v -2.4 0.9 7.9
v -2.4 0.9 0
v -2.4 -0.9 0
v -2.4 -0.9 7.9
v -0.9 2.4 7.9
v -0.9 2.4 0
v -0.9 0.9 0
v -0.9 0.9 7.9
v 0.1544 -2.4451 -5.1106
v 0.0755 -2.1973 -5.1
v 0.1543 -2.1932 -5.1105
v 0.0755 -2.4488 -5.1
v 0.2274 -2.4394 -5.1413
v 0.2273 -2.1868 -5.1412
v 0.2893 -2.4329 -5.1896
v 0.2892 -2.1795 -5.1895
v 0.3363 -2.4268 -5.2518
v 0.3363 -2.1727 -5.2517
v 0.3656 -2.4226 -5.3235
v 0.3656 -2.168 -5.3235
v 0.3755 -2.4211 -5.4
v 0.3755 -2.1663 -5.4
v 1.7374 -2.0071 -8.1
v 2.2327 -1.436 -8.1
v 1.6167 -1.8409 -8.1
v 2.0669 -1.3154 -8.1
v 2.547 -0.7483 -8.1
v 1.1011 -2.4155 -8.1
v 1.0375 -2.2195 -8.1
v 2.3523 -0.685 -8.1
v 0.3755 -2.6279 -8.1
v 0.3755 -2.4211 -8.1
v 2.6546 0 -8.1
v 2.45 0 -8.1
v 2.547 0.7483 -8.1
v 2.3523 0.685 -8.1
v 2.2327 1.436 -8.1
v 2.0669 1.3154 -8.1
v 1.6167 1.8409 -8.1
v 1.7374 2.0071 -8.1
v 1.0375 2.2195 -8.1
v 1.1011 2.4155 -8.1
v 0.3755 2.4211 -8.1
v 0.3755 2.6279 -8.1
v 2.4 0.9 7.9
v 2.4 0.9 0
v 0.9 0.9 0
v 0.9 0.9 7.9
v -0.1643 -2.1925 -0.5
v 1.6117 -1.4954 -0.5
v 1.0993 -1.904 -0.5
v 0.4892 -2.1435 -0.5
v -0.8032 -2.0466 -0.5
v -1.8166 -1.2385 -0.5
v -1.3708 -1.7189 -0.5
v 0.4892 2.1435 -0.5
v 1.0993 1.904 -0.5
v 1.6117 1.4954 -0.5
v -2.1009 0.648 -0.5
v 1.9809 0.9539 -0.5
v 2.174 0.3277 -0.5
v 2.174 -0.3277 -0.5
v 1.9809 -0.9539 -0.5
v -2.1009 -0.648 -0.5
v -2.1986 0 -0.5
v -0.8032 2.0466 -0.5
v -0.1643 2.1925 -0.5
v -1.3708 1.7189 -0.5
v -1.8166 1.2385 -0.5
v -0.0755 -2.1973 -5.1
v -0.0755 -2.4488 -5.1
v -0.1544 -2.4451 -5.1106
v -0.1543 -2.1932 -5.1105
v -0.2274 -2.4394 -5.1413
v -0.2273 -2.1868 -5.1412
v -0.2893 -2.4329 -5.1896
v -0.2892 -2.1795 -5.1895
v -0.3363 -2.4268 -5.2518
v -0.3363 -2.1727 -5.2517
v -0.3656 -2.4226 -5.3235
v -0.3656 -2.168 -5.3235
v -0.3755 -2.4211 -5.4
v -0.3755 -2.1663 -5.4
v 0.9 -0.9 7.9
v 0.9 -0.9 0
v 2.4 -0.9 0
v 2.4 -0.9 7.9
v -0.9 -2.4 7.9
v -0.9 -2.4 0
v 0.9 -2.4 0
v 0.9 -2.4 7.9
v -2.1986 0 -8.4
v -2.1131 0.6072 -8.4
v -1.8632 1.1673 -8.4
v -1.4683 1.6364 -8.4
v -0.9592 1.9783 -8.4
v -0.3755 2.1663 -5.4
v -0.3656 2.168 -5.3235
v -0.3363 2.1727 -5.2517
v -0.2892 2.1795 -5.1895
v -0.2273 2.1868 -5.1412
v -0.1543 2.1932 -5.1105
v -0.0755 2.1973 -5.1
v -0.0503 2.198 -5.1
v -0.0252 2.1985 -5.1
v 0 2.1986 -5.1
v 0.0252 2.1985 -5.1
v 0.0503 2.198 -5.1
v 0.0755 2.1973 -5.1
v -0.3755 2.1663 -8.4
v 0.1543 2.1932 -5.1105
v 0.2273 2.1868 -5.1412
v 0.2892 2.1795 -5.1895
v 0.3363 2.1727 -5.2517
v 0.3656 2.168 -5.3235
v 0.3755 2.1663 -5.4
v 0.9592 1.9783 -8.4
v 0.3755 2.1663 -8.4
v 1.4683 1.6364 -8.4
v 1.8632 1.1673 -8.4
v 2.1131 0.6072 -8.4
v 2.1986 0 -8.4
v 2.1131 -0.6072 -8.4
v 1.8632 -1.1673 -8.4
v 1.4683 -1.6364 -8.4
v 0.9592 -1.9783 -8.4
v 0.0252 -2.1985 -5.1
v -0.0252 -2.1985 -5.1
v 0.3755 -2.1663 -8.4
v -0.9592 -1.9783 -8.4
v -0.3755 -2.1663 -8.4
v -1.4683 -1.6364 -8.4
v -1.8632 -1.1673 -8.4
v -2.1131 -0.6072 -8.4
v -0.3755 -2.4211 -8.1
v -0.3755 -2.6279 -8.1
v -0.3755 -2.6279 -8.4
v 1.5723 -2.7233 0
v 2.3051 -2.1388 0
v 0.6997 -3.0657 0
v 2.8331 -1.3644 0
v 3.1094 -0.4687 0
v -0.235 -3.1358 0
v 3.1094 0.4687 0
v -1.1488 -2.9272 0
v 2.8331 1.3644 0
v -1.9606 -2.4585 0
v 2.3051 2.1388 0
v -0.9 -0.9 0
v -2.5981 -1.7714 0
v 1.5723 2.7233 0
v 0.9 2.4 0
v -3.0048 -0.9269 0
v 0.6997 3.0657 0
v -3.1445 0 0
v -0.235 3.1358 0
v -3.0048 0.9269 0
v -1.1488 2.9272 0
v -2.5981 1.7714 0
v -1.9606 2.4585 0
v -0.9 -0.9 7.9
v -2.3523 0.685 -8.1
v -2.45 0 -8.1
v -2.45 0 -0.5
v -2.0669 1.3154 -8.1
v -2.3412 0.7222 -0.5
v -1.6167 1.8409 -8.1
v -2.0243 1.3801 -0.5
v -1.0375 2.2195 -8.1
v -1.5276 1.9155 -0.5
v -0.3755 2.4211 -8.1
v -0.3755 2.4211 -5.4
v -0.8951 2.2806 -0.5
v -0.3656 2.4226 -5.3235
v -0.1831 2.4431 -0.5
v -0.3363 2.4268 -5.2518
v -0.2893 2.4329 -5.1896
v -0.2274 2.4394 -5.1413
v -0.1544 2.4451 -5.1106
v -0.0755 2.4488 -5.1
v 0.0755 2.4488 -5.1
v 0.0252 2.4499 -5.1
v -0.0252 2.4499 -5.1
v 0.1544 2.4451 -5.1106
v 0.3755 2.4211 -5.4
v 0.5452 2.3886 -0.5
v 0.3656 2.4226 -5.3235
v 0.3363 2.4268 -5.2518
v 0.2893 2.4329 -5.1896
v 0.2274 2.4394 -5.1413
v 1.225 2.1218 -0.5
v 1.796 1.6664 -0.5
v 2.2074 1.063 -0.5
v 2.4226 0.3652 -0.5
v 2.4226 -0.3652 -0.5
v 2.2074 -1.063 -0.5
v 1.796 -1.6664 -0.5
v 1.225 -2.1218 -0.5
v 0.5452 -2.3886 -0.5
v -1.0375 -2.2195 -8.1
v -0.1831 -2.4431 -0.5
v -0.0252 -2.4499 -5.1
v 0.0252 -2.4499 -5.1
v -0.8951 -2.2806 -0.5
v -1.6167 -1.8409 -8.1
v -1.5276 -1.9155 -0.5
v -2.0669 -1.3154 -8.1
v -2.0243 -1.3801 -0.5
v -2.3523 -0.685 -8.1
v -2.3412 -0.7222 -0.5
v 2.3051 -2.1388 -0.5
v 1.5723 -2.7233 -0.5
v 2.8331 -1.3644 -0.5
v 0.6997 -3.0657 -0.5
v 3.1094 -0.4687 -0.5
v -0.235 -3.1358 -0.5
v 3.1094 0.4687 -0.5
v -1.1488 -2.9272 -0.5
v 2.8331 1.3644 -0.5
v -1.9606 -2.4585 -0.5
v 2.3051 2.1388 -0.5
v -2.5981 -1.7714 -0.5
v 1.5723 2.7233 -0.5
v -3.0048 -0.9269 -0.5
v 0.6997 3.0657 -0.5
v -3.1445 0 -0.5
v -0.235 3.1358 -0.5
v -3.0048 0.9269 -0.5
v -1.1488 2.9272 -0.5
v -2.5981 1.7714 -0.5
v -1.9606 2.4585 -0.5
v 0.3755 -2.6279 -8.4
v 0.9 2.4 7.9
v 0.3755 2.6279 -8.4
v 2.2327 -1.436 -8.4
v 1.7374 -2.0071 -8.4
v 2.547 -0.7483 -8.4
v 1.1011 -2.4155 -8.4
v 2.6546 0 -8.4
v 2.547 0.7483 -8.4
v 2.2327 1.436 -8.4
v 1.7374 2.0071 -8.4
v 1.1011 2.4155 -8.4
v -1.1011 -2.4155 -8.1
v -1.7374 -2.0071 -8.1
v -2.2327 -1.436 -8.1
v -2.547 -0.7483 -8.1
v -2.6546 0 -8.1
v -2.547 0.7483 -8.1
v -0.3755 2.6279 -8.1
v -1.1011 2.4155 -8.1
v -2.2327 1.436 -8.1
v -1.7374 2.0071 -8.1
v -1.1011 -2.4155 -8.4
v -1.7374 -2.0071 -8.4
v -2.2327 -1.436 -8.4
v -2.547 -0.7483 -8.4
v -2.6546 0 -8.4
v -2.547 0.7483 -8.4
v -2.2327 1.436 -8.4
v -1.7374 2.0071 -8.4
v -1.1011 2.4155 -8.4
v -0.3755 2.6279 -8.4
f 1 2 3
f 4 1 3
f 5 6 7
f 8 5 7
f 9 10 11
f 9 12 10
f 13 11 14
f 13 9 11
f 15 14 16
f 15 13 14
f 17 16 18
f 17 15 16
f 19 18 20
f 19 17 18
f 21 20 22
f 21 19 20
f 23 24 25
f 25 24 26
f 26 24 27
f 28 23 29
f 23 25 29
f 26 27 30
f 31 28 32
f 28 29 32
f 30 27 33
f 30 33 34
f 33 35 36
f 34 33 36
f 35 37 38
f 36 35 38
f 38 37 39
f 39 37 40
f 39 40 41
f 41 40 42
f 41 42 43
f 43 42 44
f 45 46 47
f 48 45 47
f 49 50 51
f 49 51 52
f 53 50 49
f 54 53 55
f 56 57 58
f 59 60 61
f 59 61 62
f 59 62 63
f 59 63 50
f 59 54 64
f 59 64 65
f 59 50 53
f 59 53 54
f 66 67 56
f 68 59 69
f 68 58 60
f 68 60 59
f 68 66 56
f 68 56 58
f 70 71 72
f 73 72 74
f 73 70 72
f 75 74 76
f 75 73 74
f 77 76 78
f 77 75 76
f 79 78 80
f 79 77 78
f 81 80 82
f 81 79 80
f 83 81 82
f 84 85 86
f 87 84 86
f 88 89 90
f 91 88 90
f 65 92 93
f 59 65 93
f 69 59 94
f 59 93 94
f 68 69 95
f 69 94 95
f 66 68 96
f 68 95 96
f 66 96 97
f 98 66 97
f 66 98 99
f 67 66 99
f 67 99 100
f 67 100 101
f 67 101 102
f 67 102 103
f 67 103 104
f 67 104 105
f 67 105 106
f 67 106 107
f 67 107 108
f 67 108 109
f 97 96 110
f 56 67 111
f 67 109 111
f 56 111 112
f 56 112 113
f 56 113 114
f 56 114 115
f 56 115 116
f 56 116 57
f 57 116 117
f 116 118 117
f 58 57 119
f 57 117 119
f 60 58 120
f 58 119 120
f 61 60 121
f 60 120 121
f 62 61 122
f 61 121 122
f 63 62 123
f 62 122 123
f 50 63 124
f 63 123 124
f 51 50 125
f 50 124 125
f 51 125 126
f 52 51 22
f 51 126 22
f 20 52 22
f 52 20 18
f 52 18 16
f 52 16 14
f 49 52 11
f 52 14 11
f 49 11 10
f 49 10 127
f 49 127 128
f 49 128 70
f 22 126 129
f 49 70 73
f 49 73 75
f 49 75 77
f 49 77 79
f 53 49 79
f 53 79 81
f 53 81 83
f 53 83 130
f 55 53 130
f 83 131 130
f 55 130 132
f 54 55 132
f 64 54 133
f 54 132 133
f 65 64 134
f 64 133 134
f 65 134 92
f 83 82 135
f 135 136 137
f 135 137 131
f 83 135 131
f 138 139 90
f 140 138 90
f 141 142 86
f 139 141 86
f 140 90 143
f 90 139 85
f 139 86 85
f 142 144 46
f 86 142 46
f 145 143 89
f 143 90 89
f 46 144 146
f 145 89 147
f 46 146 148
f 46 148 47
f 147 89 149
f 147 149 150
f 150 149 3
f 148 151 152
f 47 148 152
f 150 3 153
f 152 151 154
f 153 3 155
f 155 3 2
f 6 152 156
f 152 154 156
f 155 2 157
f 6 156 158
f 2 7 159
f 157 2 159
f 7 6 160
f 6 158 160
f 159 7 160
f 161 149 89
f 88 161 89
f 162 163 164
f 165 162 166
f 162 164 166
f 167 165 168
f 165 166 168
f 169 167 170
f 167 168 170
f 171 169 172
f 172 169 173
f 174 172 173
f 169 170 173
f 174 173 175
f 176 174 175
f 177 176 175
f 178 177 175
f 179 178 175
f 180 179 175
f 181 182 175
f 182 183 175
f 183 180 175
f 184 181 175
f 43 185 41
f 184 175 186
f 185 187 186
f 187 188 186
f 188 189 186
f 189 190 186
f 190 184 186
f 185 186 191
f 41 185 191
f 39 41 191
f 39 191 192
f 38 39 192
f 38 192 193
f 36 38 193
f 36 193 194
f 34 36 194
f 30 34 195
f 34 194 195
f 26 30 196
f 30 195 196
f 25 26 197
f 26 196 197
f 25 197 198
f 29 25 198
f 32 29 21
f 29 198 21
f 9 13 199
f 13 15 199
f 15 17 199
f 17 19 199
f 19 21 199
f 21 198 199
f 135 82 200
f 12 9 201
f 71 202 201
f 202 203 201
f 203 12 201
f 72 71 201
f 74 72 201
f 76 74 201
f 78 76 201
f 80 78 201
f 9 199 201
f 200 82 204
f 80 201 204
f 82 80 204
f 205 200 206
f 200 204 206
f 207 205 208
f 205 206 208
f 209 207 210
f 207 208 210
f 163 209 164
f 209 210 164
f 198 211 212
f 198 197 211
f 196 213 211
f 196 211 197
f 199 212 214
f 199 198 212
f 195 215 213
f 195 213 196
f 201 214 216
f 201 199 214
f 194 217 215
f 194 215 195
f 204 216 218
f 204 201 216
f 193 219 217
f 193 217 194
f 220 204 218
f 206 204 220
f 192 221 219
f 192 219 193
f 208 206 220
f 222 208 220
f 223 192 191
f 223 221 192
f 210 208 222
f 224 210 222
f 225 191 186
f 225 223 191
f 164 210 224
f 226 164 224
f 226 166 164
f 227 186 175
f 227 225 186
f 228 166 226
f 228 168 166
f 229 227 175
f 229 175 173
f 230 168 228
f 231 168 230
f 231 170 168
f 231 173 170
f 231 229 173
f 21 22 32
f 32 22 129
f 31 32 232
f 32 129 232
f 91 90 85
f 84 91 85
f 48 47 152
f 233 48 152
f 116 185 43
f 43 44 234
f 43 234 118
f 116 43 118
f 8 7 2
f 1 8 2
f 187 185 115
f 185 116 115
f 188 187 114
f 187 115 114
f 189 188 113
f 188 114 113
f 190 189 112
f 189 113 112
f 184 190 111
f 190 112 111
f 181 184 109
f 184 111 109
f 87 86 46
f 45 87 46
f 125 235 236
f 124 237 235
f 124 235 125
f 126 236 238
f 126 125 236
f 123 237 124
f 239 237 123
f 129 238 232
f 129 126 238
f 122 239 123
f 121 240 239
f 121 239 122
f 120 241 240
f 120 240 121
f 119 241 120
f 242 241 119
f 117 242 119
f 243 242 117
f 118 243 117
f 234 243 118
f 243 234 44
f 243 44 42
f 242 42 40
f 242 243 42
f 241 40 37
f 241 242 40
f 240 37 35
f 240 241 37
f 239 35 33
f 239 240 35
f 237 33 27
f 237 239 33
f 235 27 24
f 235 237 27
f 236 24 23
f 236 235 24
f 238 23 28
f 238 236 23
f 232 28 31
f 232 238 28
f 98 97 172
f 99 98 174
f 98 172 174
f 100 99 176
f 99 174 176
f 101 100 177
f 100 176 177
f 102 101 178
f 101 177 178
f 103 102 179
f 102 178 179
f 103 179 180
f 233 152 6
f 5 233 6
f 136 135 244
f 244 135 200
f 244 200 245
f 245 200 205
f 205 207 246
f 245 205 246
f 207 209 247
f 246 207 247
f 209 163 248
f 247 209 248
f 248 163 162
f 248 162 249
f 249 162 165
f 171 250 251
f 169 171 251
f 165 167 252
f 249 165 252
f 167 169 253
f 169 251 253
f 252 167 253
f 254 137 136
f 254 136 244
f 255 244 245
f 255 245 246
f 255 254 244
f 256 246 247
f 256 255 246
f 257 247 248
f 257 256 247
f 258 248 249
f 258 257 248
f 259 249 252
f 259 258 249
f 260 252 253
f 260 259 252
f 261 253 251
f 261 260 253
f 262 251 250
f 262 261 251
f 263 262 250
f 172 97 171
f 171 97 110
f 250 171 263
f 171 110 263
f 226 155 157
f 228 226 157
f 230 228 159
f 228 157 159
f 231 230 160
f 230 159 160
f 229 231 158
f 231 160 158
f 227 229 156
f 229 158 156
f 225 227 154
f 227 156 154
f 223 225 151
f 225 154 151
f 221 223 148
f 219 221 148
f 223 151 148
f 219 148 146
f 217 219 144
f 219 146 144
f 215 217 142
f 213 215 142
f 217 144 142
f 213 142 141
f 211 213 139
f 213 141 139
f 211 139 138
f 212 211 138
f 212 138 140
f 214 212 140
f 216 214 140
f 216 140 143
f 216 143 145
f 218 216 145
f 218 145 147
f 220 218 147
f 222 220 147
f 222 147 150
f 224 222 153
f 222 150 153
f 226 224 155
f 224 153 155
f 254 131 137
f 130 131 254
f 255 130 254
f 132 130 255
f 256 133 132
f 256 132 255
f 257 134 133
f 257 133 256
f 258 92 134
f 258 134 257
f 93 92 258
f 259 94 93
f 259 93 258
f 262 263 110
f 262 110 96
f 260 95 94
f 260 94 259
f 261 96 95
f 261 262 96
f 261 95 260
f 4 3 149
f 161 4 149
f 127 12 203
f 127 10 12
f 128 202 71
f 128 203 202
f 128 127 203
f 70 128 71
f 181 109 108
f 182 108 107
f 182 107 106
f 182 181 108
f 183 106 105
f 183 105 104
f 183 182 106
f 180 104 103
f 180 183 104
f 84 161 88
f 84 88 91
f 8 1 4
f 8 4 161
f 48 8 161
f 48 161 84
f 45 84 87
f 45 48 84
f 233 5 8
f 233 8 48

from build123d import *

# Parameters (mm, degrees)
BOSS_EXTRUDE1_DEPTH = 7.9
SKETCH2_R           = 3.144549921
BOSS_EXTRUDE3_DEPTH = 0.5
SKETCH3_R           = 2.45
BOSS_EXTRUDE4_DEPTH = 7.9
SKETCH4_R           = 2.65462565
BOSS_EXTRUDE5_DEPTH = 0.3
SKETCH5_R           = 2.198604039
CUT_EXTRUDE1_DEPTH  = 7.9
CUT_EXTRUDE2_DEPTH  = 3.3
FILLET1_R           = 0.3


with BuildPart() as part:
    # Sketch1 → Boss-Extrude1 (new body)
    with BuildSketch(Plane.XY):
        Polygon((-2.4, 0.9), (-2.4, 0), (0, 0), (0, 2.4), (-0.9, 2.4), (-0.9, 0.9), align=None)
        Polygon((0, 0), (-2.4, 0), (-2.4, -0.9), (-0.9, -0.9), (-0.9, -2.4), (0, -2.4), align=None)
        Polygon((0, 2.4), (0, 0), (2.4, 0), (2.4, 0.9), (0.9, 0.9), (0.9, 2.4), align=None)
        Polygon((2.4, 0), (0, 0), (0, -2.4), (0.9, -2.4), (0.9, -0.9), (2.4, -0.9), align=None)
    extrude(amount=BOSS_EXTRUDE1_DEPTH)

    # Sketch2 → Boss-Extrude3 (add)
    with BuildSketch(Plane(origin=(0, 0, 0), x_dir=(-1, 0, 0), z_dir=(0, 0, -1))):
        Circle(SKETCH2_R)
    extrude(amount=BOSS_EXTRUDE3_DEPTH)

    # Sketch3 → Boss-Extrude4 (add)
    with BuildSketch(Plane(origin=(0, 0, -0.5), x_dir=(-1, 0, 0), z_dir=(0, 0, -1))):
        Circle(SKETCH3_R)
    extrude(amount=BOSS_EXTRUDE4_DEPTH)

    # Sketch4 → Boss-Extrude5 (add)
    with BuildSketch(Plane(origin=(0, 0, -8.4), x_dir=(-1, 0, 0), z_dir=(0, 0, -1))):
        Circle(SKETCH4_R)
    extrude(amount=-BOSS_EXTRUDE5_DEPTH)

    # Sketch5 → Cut-Extrude1 (cut)
    with BuildSketch(Plane(origin=(0, 0, -8.4), x_dir=(-1, 0, 0), z_dir=(0, 0, -1))):
        Circle(SKETCH5_R)
    extrude(amount=-CUT_EXTRUDE1_DEPTH, mode=Mode.SUBTRACT)

    # Sketch6 → Cut-Extrude2 (cut)
    with BuildSketch(Plane(origin=(0, 0, -8.4), x_dir=(-1, 0, 0), z_dir=(0, 0, -1))):
        with BuildLine():
            Line((0.375484044, 2.166303638), (0.375484044, 2.627936276))
            ThreePointArc((0.375484044, 2.627936276), (0.188215694, 2.6479449), (0, 2.65462565))
            Line((0, 2.65462565), (0, 2.198604039))
            ThreePointArc((0, 2.198604039), (0.188435389, 2.190514055), (0.375484044, 2.166303638))
        make_face()
        with BuildLine():
            Line((0, 2.198604039), (0, 2.65462565))
            ThreePointArc((0, 2.65462565), (-0.188215694, 2.6479449), (-0.375484044, 2.627936276))
            Line((-0.375484044, 2.627936276), (-0.375484044, 2.166303638))
            ThreePointArc((-0.375484044, 2.166303638), (-0.188435389, 2.190514055), (0, 2.198604039))
        make_face()
        with BuildLine():
            ThreePointArc((0, -2.65462565), (0.188215694, -2.6479449), (0.375484044, -2.627936276))
            Line((0.375484044, -2.627936276), (0.375484044, -2.166303638))
            ThreePointArc((0.375484044, -2.166303638), (0, -2.198604039), (-0.375484044, -2.166303638))
            Line((-0.375484044, -2.166303638), (-0.375484044, -2.627936276))
            ThreePointArc((-0.375484044, -2.627936276), (-0.188215694, -2.6479449), (0, -2.65462565))
        make_face()
    extrude(amount=-CUT_EXTRUDE2_DEPTH, mode=Mode.SUBTRACT)

    # Fillet1
    fillet1_edges = [part.edges().sort_by_distance(p)[0] for p in [
        (0.375484044, 2.293679776, -5.1),
        (-0.375484044, 2.293679776, -5.1),
        (-0.375484044, -2.293679776, -5.1),
        (0.375484044, -2.293679776, -5.1),
    ]]
    fillet(fillet1_edges, radius=FILLET1_R)


solid = part.part
